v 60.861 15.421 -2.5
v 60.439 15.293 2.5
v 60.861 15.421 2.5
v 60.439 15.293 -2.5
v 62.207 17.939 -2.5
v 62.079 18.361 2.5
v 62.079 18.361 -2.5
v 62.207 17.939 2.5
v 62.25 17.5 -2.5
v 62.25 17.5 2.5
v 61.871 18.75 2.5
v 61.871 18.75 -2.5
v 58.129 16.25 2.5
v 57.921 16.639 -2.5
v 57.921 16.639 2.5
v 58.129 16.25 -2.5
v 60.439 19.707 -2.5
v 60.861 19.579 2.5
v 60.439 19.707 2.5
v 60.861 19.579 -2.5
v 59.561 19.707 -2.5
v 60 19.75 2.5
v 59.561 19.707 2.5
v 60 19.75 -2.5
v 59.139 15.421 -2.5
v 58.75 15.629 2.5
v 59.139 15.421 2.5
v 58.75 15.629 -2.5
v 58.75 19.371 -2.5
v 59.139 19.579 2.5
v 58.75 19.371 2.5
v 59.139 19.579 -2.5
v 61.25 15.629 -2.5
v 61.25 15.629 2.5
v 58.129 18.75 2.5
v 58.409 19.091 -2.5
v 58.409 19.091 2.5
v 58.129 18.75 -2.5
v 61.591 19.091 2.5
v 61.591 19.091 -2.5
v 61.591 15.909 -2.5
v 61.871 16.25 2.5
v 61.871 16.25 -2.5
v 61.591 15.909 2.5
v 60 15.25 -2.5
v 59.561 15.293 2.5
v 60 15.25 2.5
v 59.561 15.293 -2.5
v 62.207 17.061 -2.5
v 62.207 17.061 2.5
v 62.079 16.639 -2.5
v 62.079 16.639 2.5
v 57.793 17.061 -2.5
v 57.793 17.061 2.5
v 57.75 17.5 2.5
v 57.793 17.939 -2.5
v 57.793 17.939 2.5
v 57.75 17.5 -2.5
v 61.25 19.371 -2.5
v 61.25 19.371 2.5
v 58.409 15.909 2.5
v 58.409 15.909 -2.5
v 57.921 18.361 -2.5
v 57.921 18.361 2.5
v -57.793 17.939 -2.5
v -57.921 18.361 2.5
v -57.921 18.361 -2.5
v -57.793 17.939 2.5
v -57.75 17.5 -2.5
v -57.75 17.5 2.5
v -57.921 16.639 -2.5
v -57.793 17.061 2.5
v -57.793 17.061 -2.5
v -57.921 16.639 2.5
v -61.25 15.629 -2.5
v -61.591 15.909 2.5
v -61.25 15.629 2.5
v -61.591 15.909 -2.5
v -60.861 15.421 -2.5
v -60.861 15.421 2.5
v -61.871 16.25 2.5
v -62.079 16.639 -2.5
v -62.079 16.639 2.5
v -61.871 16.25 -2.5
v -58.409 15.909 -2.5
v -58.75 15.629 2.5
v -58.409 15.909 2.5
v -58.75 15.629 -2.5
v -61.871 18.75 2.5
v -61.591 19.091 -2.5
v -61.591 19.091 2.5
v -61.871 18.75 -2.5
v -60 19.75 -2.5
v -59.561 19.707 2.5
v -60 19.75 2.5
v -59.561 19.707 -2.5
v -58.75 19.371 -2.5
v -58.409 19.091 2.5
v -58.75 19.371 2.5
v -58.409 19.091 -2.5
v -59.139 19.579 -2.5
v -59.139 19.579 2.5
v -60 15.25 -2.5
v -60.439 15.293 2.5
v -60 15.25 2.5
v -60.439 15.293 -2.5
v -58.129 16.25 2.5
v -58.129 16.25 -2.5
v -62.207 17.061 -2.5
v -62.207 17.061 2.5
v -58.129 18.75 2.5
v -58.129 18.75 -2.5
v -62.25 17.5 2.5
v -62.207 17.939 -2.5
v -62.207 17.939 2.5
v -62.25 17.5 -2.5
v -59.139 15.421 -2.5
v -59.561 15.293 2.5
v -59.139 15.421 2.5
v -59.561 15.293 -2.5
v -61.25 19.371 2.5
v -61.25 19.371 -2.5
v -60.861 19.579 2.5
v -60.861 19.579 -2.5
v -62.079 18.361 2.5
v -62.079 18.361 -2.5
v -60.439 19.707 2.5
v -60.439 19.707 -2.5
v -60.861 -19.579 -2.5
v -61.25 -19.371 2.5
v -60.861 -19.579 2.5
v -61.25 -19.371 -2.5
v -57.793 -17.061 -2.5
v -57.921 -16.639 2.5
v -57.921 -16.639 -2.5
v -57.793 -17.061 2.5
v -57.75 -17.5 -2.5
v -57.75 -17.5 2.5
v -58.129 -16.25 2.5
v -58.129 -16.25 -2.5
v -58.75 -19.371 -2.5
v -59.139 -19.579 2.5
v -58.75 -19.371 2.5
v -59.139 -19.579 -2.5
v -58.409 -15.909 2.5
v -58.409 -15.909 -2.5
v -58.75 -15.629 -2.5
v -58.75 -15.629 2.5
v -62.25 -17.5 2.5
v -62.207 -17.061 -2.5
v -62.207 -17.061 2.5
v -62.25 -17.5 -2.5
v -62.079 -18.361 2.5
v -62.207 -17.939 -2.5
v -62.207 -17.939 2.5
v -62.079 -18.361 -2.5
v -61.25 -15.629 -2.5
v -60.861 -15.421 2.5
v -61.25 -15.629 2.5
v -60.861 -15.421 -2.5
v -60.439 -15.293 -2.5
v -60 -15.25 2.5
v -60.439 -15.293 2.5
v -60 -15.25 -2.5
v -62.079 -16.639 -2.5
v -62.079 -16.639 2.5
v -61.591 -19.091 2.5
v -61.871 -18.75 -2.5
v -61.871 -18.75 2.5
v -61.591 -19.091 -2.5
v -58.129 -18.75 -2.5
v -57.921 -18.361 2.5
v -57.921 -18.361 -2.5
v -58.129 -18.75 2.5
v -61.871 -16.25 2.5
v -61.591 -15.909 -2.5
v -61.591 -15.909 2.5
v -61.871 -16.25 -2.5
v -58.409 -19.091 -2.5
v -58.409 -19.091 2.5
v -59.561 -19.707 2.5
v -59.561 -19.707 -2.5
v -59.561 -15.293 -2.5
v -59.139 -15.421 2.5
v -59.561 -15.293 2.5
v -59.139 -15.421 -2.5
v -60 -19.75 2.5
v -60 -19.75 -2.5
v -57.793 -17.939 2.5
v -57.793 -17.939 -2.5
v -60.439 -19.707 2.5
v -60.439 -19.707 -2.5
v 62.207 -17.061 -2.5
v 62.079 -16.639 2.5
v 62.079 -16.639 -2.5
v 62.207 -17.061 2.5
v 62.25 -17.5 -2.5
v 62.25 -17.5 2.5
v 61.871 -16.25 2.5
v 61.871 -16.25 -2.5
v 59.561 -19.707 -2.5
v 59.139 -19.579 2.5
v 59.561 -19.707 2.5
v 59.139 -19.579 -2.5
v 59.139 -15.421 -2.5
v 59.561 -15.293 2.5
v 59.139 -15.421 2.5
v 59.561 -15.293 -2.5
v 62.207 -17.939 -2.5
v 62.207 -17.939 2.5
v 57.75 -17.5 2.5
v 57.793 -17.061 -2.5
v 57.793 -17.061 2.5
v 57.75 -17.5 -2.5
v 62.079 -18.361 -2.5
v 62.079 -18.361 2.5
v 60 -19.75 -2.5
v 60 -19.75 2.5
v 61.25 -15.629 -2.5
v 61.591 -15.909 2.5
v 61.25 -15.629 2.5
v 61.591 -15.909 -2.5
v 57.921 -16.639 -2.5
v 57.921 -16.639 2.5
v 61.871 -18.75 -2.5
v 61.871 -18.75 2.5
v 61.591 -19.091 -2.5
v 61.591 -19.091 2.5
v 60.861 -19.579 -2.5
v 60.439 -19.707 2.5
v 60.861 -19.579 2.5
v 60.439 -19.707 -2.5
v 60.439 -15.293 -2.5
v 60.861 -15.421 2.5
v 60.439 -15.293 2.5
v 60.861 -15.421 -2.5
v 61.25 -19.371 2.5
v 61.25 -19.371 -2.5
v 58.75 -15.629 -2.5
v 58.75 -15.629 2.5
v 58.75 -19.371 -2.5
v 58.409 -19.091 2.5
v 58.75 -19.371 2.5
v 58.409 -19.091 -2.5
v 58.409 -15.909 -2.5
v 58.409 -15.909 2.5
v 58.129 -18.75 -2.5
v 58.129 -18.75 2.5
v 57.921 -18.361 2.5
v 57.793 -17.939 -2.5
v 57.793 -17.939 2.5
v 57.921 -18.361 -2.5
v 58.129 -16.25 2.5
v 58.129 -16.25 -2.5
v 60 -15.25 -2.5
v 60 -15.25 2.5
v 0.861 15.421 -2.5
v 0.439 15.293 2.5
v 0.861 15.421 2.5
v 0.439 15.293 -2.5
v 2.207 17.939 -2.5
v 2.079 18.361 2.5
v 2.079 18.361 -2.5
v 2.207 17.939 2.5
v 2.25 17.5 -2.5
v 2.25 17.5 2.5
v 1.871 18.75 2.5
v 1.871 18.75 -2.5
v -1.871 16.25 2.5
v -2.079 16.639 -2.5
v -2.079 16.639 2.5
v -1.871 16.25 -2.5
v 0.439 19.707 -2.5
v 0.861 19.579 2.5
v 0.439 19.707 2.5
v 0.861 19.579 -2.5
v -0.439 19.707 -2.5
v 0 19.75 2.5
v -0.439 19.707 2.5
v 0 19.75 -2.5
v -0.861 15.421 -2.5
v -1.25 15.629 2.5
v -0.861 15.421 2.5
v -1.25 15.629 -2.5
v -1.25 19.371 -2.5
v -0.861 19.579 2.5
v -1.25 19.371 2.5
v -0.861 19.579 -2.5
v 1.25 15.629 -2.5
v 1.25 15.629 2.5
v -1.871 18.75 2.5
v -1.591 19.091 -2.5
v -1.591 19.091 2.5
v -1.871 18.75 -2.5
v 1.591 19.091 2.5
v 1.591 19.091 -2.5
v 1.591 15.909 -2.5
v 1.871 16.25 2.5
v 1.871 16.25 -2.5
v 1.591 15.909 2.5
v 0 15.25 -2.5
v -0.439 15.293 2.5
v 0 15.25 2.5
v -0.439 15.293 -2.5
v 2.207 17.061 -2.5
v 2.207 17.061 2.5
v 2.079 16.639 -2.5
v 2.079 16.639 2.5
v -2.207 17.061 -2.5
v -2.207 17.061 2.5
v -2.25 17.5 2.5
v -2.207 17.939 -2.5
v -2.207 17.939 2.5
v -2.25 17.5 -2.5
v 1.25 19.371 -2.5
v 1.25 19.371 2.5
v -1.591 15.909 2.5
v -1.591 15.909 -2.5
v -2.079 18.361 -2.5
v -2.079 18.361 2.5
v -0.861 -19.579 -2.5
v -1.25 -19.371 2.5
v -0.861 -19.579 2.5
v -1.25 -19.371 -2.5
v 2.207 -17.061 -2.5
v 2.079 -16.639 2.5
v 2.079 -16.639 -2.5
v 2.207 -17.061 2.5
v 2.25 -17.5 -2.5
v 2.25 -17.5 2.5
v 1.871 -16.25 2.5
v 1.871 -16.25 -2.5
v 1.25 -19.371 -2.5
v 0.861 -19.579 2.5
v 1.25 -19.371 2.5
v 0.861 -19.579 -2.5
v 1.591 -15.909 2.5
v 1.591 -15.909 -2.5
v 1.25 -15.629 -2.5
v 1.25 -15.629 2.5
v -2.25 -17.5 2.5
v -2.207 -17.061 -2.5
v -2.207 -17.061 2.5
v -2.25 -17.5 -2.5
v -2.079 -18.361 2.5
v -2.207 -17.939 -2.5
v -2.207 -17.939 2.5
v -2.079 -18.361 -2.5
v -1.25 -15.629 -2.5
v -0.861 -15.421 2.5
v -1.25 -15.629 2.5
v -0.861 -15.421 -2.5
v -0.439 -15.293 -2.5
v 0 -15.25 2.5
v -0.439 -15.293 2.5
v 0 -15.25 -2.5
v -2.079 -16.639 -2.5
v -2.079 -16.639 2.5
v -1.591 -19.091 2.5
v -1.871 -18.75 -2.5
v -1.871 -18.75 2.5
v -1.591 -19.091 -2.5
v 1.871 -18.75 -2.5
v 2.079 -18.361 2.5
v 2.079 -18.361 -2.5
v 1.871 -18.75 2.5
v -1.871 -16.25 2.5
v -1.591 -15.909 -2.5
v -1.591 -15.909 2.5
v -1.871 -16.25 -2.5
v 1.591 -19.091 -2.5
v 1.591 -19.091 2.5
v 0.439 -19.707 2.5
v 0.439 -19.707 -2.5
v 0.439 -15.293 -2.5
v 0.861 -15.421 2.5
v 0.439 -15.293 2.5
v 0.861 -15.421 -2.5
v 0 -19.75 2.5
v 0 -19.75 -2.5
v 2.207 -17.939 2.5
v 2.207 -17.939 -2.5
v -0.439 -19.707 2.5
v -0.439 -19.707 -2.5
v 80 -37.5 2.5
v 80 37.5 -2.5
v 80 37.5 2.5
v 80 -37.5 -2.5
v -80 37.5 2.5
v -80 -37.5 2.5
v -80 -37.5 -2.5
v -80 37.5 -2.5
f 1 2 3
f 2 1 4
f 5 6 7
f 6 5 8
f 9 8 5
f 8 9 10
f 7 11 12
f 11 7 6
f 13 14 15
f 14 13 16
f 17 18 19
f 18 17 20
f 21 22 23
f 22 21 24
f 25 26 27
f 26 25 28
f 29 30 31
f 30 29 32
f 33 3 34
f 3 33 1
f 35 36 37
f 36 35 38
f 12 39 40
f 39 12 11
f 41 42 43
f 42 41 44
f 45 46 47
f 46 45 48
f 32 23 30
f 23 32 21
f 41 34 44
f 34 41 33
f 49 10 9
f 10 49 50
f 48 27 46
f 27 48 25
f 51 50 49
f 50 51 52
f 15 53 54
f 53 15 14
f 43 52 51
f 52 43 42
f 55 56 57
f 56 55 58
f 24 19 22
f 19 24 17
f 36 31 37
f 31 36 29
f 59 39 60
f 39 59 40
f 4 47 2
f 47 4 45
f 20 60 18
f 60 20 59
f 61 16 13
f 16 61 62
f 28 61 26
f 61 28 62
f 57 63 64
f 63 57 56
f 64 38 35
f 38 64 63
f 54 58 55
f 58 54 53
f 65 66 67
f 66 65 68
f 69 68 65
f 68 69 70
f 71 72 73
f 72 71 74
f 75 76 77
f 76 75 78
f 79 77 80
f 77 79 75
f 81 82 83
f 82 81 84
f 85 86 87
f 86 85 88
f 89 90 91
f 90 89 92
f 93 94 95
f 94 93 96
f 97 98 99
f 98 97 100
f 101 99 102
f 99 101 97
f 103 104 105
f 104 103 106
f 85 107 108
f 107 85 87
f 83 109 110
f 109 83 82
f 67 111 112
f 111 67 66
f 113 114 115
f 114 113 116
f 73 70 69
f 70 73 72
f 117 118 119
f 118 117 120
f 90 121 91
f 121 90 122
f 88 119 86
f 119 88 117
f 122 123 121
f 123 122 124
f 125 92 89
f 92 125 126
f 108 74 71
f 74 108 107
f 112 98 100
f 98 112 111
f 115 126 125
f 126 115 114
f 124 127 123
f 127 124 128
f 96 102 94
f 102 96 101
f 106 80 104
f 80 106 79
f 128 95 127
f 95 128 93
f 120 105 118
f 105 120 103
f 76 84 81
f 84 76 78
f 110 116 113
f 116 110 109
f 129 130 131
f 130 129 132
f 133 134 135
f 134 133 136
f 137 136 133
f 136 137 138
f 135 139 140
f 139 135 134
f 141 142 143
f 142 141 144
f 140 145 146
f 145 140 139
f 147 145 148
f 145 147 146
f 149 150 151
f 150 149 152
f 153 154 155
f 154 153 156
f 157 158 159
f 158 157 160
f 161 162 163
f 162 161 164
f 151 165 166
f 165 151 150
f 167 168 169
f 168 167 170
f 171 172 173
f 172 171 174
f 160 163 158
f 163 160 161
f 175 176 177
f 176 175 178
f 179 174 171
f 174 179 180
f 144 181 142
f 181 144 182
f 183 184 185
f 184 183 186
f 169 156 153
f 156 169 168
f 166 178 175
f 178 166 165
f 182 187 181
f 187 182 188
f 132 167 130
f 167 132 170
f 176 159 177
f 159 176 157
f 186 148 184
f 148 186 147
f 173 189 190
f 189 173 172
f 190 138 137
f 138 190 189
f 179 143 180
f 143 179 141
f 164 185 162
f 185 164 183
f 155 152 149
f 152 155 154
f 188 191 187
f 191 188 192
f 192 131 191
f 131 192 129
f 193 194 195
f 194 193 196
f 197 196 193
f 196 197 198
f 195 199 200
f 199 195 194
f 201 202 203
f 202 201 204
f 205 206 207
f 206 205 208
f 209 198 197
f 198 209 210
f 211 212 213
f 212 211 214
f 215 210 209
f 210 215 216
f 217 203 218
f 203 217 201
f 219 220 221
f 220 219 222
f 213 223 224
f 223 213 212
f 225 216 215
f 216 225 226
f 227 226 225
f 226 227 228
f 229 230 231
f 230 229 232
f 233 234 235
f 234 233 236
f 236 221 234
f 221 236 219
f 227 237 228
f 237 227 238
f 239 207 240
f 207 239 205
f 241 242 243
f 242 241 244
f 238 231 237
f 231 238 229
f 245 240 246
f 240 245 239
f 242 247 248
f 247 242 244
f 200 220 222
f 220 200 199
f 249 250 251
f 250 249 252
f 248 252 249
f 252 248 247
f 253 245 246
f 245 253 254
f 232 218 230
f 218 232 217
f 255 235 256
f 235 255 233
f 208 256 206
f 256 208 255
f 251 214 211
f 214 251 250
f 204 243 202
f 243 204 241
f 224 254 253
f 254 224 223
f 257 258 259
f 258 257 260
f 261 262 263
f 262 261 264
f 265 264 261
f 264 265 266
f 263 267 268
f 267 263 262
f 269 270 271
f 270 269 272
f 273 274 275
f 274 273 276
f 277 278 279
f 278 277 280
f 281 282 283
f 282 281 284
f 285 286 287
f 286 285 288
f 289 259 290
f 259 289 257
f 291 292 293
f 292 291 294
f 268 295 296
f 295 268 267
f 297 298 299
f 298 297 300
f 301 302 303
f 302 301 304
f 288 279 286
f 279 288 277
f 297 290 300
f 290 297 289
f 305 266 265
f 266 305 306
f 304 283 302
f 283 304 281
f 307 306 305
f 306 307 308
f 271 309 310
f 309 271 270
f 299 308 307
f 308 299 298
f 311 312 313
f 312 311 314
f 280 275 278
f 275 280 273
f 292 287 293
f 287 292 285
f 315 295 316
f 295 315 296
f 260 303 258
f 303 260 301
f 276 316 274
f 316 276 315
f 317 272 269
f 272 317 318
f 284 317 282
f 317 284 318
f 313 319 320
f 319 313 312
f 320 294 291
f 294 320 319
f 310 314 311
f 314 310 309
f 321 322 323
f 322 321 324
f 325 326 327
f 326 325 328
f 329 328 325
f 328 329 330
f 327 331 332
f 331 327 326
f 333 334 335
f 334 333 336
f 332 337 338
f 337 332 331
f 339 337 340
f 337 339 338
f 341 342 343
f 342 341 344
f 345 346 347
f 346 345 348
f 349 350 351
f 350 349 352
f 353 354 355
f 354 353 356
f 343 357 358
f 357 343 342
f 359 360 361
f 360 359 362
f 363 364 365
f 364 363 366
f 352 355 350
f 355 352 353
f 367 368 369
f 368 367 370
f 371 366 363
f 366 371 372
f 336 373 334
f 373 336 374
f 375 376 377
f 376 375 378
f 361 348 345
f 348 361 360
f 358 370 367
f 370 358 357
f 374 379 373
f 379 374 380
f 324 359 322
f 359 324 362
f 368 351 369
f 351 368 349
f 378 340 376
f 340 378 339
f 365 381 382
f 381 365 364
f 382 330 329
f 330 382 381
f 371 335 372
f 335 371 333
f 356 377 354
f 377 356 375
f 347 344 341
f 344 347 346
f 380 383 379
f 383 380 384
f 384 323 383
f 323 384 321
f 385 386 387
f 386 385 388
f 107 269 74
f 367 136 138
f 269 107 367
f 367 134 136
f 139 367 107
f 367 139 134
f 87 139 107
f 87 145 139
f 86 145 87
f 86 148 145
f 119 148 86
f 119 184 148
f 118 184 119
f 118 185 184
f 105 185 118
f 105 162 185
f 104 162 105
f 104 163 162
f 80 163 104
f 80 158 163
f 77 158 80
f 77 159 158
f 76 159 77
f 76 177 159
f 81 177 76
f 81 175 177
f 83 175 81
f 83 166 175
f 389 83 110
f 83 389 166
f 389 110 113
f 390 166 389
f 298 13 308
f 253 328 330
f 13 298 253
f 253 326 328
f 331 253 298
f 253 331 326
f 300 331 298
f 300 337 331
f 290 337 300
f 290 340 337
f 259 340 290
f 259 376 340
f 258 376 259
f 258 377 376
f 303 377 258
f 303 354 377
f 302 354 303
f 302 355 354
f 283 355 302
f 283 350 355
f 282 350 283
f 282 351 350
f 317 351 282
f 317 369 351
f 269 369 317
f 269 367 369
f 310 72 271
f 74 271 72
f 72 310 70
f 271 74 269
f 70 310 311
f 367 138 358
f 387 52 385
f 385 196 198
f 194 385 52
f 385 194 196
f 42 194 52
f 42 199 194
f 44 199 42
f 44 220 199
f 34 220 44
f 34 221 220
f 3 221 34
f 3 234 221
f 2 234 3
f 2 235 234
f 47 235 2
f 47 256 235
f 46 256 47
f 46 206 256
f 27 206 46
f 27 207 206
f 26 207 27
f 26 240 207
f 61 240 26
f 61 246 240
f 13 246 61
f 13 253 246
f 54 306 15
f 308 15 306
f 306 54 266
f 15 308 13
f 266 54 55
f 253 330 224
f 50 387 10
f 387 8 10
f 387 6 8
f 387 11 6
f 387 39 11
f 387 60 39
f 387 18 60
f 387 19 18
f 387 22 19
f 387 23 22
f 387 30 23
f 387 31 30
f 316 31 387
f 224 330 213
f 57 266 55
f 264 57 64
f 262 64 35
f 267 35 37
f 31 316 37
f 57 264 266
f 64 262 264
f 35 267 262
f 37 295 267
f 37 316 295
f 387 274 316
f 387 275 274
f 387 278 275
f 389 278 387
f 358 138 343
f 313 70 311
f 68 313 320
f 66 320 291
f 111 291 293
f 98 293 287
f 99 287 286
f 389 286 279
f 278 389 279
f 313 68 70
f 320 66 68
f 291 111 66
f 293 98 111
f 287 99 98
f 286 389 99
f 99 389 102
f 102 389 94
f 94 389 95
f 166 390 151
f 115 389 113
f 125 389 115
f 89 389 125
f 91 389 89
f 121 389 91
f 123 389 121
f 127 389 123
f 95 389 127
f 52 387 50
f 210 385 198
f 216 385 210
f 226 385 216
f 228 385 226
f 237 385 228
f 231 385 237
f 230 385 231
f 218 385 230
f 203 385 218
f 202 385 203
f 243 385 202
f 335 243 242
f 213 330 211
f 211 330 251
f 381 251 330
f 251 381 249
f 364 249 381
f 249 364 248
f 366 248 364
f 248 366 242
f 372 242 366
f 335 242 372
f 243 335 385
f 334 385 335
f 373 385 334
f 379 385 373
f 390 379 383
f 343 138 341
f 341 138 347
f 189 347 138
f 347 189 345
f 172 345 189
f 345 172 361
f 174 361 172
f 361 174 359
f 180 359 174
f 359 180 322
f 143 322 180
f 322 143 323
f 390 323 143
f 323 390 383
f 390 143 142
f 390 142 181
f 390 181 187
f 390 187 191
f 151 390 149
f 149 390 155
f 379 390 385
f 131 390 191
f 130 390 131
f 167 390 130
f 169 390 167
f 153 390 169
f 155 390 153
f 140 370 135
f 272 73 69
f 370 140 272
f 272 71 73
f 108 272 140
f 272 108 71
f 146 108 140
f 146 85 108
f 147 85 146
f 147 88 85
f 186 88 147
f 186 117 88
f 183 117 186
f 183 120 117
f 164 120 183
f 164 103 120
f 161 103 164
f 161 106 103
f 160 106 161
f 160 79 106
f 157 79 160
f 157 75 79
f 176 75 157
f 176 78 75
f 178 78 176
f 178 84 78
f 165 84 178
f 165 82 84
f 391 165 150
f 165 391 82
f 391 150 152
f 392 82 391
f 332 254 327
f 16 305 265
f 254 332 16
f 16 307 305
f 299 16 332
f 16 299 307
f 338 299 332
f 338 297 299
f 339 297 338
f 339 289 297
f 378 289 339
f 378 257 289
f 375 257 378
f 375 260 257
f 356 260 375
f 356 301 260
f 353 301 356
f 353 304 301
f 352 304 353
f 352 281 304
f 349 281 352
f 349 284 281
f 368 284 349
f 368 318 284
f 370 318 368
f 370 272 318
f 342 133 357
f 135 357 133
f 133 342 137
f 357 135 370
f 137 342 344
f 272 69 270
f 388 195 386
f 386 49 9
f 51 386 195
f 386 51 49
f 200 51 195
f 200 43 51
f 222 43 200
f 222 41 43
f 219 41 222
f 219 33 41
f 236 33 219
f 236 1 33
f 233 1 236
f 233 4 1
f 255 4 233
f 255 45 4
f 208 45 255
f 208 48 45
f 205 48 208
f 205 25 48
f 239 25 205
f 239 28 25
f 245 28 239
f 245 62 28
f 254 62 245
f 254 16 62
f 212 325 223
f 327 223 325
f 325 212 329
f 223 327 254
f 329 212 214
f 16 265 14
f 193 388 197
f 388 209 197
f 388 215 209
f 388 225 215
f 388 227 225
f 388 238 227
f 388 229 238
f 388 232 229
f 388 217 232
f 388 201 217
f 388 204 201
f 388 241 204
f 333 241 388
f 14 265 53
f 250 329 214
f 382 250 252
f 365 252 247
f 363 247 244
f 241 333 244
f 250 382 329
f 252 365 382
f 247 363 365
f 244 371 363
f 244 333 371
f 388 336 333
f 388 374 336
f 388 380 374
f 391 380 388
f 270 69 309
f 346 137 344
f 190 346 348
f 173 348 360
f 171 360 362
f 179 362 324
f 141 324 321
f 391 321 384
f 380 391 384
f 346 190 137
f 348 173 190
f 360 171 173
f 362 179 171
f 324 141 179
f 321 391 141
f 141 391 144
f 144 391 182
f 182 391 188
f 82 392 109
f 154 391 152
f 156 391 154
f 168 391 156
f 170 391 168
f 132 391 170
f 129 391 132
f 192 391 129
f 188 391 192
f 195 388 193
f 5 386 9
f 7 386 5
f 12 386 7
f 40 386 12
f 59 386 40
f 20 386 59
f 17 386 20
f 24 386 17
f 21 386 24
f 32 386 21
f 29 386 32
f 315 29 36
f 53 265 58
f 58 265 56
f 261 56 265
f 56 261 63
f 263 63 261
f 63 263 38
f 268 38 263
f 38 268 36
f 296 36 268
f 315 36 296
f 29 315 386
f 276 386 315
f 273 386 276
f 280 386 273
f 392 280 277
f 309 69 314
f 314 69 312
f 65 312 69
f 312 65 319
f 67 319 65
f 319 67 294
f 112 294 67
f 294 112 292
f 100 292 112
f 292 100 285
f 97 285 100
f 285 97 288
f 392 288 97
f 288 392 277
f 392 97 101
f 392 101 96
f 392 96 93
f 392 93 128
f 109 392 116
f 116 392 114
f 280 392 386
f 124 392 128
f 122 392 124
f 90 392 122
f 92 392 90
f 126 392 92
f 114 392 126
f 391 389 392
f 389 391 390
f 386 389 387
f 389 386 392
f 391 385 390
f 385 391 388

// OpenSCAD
$fn = 32;

// ----------------------------------------------------------------------
// Corner plate 160 x 75 x 5
// 6 holes, centres taken from the edge offset
// ----------------------------------------------------------------------

// --- parameters (mm) ---
plate = [160, 75, 5];  // overall size (x, y, z)
holes = 6;             // number of holes the drawing asks for
hole_d = 4.5;          // hole diameter
edge = 20;             // hole centre offset from the plate edge

// --- derived feature positions (mm) ---
corner_x = plate[0] / 2 - edge;  // = 60   corner hole X
corner_y = plate[1] / 2 - edge;  // = 17.5   corner hole Y
feature_centers = [
  [corner_x, corner_y],
  [-corner_x, corner_y],
  [-corner_x, -corner_y],
  [corner_x, -corner_y],
  [0, corner_y],
  [0, -corner_y]
];   // hole centres the loop below drills

// plate outline, every hole drilled through with the same cutters
difference() {
  cube(plate, center = true);
  for (centre = feature_centers)
    translate([centre[0], centre[1], 0])
      cylinder(d = hole_d, h = plate[2] + 2, center = true);
}
